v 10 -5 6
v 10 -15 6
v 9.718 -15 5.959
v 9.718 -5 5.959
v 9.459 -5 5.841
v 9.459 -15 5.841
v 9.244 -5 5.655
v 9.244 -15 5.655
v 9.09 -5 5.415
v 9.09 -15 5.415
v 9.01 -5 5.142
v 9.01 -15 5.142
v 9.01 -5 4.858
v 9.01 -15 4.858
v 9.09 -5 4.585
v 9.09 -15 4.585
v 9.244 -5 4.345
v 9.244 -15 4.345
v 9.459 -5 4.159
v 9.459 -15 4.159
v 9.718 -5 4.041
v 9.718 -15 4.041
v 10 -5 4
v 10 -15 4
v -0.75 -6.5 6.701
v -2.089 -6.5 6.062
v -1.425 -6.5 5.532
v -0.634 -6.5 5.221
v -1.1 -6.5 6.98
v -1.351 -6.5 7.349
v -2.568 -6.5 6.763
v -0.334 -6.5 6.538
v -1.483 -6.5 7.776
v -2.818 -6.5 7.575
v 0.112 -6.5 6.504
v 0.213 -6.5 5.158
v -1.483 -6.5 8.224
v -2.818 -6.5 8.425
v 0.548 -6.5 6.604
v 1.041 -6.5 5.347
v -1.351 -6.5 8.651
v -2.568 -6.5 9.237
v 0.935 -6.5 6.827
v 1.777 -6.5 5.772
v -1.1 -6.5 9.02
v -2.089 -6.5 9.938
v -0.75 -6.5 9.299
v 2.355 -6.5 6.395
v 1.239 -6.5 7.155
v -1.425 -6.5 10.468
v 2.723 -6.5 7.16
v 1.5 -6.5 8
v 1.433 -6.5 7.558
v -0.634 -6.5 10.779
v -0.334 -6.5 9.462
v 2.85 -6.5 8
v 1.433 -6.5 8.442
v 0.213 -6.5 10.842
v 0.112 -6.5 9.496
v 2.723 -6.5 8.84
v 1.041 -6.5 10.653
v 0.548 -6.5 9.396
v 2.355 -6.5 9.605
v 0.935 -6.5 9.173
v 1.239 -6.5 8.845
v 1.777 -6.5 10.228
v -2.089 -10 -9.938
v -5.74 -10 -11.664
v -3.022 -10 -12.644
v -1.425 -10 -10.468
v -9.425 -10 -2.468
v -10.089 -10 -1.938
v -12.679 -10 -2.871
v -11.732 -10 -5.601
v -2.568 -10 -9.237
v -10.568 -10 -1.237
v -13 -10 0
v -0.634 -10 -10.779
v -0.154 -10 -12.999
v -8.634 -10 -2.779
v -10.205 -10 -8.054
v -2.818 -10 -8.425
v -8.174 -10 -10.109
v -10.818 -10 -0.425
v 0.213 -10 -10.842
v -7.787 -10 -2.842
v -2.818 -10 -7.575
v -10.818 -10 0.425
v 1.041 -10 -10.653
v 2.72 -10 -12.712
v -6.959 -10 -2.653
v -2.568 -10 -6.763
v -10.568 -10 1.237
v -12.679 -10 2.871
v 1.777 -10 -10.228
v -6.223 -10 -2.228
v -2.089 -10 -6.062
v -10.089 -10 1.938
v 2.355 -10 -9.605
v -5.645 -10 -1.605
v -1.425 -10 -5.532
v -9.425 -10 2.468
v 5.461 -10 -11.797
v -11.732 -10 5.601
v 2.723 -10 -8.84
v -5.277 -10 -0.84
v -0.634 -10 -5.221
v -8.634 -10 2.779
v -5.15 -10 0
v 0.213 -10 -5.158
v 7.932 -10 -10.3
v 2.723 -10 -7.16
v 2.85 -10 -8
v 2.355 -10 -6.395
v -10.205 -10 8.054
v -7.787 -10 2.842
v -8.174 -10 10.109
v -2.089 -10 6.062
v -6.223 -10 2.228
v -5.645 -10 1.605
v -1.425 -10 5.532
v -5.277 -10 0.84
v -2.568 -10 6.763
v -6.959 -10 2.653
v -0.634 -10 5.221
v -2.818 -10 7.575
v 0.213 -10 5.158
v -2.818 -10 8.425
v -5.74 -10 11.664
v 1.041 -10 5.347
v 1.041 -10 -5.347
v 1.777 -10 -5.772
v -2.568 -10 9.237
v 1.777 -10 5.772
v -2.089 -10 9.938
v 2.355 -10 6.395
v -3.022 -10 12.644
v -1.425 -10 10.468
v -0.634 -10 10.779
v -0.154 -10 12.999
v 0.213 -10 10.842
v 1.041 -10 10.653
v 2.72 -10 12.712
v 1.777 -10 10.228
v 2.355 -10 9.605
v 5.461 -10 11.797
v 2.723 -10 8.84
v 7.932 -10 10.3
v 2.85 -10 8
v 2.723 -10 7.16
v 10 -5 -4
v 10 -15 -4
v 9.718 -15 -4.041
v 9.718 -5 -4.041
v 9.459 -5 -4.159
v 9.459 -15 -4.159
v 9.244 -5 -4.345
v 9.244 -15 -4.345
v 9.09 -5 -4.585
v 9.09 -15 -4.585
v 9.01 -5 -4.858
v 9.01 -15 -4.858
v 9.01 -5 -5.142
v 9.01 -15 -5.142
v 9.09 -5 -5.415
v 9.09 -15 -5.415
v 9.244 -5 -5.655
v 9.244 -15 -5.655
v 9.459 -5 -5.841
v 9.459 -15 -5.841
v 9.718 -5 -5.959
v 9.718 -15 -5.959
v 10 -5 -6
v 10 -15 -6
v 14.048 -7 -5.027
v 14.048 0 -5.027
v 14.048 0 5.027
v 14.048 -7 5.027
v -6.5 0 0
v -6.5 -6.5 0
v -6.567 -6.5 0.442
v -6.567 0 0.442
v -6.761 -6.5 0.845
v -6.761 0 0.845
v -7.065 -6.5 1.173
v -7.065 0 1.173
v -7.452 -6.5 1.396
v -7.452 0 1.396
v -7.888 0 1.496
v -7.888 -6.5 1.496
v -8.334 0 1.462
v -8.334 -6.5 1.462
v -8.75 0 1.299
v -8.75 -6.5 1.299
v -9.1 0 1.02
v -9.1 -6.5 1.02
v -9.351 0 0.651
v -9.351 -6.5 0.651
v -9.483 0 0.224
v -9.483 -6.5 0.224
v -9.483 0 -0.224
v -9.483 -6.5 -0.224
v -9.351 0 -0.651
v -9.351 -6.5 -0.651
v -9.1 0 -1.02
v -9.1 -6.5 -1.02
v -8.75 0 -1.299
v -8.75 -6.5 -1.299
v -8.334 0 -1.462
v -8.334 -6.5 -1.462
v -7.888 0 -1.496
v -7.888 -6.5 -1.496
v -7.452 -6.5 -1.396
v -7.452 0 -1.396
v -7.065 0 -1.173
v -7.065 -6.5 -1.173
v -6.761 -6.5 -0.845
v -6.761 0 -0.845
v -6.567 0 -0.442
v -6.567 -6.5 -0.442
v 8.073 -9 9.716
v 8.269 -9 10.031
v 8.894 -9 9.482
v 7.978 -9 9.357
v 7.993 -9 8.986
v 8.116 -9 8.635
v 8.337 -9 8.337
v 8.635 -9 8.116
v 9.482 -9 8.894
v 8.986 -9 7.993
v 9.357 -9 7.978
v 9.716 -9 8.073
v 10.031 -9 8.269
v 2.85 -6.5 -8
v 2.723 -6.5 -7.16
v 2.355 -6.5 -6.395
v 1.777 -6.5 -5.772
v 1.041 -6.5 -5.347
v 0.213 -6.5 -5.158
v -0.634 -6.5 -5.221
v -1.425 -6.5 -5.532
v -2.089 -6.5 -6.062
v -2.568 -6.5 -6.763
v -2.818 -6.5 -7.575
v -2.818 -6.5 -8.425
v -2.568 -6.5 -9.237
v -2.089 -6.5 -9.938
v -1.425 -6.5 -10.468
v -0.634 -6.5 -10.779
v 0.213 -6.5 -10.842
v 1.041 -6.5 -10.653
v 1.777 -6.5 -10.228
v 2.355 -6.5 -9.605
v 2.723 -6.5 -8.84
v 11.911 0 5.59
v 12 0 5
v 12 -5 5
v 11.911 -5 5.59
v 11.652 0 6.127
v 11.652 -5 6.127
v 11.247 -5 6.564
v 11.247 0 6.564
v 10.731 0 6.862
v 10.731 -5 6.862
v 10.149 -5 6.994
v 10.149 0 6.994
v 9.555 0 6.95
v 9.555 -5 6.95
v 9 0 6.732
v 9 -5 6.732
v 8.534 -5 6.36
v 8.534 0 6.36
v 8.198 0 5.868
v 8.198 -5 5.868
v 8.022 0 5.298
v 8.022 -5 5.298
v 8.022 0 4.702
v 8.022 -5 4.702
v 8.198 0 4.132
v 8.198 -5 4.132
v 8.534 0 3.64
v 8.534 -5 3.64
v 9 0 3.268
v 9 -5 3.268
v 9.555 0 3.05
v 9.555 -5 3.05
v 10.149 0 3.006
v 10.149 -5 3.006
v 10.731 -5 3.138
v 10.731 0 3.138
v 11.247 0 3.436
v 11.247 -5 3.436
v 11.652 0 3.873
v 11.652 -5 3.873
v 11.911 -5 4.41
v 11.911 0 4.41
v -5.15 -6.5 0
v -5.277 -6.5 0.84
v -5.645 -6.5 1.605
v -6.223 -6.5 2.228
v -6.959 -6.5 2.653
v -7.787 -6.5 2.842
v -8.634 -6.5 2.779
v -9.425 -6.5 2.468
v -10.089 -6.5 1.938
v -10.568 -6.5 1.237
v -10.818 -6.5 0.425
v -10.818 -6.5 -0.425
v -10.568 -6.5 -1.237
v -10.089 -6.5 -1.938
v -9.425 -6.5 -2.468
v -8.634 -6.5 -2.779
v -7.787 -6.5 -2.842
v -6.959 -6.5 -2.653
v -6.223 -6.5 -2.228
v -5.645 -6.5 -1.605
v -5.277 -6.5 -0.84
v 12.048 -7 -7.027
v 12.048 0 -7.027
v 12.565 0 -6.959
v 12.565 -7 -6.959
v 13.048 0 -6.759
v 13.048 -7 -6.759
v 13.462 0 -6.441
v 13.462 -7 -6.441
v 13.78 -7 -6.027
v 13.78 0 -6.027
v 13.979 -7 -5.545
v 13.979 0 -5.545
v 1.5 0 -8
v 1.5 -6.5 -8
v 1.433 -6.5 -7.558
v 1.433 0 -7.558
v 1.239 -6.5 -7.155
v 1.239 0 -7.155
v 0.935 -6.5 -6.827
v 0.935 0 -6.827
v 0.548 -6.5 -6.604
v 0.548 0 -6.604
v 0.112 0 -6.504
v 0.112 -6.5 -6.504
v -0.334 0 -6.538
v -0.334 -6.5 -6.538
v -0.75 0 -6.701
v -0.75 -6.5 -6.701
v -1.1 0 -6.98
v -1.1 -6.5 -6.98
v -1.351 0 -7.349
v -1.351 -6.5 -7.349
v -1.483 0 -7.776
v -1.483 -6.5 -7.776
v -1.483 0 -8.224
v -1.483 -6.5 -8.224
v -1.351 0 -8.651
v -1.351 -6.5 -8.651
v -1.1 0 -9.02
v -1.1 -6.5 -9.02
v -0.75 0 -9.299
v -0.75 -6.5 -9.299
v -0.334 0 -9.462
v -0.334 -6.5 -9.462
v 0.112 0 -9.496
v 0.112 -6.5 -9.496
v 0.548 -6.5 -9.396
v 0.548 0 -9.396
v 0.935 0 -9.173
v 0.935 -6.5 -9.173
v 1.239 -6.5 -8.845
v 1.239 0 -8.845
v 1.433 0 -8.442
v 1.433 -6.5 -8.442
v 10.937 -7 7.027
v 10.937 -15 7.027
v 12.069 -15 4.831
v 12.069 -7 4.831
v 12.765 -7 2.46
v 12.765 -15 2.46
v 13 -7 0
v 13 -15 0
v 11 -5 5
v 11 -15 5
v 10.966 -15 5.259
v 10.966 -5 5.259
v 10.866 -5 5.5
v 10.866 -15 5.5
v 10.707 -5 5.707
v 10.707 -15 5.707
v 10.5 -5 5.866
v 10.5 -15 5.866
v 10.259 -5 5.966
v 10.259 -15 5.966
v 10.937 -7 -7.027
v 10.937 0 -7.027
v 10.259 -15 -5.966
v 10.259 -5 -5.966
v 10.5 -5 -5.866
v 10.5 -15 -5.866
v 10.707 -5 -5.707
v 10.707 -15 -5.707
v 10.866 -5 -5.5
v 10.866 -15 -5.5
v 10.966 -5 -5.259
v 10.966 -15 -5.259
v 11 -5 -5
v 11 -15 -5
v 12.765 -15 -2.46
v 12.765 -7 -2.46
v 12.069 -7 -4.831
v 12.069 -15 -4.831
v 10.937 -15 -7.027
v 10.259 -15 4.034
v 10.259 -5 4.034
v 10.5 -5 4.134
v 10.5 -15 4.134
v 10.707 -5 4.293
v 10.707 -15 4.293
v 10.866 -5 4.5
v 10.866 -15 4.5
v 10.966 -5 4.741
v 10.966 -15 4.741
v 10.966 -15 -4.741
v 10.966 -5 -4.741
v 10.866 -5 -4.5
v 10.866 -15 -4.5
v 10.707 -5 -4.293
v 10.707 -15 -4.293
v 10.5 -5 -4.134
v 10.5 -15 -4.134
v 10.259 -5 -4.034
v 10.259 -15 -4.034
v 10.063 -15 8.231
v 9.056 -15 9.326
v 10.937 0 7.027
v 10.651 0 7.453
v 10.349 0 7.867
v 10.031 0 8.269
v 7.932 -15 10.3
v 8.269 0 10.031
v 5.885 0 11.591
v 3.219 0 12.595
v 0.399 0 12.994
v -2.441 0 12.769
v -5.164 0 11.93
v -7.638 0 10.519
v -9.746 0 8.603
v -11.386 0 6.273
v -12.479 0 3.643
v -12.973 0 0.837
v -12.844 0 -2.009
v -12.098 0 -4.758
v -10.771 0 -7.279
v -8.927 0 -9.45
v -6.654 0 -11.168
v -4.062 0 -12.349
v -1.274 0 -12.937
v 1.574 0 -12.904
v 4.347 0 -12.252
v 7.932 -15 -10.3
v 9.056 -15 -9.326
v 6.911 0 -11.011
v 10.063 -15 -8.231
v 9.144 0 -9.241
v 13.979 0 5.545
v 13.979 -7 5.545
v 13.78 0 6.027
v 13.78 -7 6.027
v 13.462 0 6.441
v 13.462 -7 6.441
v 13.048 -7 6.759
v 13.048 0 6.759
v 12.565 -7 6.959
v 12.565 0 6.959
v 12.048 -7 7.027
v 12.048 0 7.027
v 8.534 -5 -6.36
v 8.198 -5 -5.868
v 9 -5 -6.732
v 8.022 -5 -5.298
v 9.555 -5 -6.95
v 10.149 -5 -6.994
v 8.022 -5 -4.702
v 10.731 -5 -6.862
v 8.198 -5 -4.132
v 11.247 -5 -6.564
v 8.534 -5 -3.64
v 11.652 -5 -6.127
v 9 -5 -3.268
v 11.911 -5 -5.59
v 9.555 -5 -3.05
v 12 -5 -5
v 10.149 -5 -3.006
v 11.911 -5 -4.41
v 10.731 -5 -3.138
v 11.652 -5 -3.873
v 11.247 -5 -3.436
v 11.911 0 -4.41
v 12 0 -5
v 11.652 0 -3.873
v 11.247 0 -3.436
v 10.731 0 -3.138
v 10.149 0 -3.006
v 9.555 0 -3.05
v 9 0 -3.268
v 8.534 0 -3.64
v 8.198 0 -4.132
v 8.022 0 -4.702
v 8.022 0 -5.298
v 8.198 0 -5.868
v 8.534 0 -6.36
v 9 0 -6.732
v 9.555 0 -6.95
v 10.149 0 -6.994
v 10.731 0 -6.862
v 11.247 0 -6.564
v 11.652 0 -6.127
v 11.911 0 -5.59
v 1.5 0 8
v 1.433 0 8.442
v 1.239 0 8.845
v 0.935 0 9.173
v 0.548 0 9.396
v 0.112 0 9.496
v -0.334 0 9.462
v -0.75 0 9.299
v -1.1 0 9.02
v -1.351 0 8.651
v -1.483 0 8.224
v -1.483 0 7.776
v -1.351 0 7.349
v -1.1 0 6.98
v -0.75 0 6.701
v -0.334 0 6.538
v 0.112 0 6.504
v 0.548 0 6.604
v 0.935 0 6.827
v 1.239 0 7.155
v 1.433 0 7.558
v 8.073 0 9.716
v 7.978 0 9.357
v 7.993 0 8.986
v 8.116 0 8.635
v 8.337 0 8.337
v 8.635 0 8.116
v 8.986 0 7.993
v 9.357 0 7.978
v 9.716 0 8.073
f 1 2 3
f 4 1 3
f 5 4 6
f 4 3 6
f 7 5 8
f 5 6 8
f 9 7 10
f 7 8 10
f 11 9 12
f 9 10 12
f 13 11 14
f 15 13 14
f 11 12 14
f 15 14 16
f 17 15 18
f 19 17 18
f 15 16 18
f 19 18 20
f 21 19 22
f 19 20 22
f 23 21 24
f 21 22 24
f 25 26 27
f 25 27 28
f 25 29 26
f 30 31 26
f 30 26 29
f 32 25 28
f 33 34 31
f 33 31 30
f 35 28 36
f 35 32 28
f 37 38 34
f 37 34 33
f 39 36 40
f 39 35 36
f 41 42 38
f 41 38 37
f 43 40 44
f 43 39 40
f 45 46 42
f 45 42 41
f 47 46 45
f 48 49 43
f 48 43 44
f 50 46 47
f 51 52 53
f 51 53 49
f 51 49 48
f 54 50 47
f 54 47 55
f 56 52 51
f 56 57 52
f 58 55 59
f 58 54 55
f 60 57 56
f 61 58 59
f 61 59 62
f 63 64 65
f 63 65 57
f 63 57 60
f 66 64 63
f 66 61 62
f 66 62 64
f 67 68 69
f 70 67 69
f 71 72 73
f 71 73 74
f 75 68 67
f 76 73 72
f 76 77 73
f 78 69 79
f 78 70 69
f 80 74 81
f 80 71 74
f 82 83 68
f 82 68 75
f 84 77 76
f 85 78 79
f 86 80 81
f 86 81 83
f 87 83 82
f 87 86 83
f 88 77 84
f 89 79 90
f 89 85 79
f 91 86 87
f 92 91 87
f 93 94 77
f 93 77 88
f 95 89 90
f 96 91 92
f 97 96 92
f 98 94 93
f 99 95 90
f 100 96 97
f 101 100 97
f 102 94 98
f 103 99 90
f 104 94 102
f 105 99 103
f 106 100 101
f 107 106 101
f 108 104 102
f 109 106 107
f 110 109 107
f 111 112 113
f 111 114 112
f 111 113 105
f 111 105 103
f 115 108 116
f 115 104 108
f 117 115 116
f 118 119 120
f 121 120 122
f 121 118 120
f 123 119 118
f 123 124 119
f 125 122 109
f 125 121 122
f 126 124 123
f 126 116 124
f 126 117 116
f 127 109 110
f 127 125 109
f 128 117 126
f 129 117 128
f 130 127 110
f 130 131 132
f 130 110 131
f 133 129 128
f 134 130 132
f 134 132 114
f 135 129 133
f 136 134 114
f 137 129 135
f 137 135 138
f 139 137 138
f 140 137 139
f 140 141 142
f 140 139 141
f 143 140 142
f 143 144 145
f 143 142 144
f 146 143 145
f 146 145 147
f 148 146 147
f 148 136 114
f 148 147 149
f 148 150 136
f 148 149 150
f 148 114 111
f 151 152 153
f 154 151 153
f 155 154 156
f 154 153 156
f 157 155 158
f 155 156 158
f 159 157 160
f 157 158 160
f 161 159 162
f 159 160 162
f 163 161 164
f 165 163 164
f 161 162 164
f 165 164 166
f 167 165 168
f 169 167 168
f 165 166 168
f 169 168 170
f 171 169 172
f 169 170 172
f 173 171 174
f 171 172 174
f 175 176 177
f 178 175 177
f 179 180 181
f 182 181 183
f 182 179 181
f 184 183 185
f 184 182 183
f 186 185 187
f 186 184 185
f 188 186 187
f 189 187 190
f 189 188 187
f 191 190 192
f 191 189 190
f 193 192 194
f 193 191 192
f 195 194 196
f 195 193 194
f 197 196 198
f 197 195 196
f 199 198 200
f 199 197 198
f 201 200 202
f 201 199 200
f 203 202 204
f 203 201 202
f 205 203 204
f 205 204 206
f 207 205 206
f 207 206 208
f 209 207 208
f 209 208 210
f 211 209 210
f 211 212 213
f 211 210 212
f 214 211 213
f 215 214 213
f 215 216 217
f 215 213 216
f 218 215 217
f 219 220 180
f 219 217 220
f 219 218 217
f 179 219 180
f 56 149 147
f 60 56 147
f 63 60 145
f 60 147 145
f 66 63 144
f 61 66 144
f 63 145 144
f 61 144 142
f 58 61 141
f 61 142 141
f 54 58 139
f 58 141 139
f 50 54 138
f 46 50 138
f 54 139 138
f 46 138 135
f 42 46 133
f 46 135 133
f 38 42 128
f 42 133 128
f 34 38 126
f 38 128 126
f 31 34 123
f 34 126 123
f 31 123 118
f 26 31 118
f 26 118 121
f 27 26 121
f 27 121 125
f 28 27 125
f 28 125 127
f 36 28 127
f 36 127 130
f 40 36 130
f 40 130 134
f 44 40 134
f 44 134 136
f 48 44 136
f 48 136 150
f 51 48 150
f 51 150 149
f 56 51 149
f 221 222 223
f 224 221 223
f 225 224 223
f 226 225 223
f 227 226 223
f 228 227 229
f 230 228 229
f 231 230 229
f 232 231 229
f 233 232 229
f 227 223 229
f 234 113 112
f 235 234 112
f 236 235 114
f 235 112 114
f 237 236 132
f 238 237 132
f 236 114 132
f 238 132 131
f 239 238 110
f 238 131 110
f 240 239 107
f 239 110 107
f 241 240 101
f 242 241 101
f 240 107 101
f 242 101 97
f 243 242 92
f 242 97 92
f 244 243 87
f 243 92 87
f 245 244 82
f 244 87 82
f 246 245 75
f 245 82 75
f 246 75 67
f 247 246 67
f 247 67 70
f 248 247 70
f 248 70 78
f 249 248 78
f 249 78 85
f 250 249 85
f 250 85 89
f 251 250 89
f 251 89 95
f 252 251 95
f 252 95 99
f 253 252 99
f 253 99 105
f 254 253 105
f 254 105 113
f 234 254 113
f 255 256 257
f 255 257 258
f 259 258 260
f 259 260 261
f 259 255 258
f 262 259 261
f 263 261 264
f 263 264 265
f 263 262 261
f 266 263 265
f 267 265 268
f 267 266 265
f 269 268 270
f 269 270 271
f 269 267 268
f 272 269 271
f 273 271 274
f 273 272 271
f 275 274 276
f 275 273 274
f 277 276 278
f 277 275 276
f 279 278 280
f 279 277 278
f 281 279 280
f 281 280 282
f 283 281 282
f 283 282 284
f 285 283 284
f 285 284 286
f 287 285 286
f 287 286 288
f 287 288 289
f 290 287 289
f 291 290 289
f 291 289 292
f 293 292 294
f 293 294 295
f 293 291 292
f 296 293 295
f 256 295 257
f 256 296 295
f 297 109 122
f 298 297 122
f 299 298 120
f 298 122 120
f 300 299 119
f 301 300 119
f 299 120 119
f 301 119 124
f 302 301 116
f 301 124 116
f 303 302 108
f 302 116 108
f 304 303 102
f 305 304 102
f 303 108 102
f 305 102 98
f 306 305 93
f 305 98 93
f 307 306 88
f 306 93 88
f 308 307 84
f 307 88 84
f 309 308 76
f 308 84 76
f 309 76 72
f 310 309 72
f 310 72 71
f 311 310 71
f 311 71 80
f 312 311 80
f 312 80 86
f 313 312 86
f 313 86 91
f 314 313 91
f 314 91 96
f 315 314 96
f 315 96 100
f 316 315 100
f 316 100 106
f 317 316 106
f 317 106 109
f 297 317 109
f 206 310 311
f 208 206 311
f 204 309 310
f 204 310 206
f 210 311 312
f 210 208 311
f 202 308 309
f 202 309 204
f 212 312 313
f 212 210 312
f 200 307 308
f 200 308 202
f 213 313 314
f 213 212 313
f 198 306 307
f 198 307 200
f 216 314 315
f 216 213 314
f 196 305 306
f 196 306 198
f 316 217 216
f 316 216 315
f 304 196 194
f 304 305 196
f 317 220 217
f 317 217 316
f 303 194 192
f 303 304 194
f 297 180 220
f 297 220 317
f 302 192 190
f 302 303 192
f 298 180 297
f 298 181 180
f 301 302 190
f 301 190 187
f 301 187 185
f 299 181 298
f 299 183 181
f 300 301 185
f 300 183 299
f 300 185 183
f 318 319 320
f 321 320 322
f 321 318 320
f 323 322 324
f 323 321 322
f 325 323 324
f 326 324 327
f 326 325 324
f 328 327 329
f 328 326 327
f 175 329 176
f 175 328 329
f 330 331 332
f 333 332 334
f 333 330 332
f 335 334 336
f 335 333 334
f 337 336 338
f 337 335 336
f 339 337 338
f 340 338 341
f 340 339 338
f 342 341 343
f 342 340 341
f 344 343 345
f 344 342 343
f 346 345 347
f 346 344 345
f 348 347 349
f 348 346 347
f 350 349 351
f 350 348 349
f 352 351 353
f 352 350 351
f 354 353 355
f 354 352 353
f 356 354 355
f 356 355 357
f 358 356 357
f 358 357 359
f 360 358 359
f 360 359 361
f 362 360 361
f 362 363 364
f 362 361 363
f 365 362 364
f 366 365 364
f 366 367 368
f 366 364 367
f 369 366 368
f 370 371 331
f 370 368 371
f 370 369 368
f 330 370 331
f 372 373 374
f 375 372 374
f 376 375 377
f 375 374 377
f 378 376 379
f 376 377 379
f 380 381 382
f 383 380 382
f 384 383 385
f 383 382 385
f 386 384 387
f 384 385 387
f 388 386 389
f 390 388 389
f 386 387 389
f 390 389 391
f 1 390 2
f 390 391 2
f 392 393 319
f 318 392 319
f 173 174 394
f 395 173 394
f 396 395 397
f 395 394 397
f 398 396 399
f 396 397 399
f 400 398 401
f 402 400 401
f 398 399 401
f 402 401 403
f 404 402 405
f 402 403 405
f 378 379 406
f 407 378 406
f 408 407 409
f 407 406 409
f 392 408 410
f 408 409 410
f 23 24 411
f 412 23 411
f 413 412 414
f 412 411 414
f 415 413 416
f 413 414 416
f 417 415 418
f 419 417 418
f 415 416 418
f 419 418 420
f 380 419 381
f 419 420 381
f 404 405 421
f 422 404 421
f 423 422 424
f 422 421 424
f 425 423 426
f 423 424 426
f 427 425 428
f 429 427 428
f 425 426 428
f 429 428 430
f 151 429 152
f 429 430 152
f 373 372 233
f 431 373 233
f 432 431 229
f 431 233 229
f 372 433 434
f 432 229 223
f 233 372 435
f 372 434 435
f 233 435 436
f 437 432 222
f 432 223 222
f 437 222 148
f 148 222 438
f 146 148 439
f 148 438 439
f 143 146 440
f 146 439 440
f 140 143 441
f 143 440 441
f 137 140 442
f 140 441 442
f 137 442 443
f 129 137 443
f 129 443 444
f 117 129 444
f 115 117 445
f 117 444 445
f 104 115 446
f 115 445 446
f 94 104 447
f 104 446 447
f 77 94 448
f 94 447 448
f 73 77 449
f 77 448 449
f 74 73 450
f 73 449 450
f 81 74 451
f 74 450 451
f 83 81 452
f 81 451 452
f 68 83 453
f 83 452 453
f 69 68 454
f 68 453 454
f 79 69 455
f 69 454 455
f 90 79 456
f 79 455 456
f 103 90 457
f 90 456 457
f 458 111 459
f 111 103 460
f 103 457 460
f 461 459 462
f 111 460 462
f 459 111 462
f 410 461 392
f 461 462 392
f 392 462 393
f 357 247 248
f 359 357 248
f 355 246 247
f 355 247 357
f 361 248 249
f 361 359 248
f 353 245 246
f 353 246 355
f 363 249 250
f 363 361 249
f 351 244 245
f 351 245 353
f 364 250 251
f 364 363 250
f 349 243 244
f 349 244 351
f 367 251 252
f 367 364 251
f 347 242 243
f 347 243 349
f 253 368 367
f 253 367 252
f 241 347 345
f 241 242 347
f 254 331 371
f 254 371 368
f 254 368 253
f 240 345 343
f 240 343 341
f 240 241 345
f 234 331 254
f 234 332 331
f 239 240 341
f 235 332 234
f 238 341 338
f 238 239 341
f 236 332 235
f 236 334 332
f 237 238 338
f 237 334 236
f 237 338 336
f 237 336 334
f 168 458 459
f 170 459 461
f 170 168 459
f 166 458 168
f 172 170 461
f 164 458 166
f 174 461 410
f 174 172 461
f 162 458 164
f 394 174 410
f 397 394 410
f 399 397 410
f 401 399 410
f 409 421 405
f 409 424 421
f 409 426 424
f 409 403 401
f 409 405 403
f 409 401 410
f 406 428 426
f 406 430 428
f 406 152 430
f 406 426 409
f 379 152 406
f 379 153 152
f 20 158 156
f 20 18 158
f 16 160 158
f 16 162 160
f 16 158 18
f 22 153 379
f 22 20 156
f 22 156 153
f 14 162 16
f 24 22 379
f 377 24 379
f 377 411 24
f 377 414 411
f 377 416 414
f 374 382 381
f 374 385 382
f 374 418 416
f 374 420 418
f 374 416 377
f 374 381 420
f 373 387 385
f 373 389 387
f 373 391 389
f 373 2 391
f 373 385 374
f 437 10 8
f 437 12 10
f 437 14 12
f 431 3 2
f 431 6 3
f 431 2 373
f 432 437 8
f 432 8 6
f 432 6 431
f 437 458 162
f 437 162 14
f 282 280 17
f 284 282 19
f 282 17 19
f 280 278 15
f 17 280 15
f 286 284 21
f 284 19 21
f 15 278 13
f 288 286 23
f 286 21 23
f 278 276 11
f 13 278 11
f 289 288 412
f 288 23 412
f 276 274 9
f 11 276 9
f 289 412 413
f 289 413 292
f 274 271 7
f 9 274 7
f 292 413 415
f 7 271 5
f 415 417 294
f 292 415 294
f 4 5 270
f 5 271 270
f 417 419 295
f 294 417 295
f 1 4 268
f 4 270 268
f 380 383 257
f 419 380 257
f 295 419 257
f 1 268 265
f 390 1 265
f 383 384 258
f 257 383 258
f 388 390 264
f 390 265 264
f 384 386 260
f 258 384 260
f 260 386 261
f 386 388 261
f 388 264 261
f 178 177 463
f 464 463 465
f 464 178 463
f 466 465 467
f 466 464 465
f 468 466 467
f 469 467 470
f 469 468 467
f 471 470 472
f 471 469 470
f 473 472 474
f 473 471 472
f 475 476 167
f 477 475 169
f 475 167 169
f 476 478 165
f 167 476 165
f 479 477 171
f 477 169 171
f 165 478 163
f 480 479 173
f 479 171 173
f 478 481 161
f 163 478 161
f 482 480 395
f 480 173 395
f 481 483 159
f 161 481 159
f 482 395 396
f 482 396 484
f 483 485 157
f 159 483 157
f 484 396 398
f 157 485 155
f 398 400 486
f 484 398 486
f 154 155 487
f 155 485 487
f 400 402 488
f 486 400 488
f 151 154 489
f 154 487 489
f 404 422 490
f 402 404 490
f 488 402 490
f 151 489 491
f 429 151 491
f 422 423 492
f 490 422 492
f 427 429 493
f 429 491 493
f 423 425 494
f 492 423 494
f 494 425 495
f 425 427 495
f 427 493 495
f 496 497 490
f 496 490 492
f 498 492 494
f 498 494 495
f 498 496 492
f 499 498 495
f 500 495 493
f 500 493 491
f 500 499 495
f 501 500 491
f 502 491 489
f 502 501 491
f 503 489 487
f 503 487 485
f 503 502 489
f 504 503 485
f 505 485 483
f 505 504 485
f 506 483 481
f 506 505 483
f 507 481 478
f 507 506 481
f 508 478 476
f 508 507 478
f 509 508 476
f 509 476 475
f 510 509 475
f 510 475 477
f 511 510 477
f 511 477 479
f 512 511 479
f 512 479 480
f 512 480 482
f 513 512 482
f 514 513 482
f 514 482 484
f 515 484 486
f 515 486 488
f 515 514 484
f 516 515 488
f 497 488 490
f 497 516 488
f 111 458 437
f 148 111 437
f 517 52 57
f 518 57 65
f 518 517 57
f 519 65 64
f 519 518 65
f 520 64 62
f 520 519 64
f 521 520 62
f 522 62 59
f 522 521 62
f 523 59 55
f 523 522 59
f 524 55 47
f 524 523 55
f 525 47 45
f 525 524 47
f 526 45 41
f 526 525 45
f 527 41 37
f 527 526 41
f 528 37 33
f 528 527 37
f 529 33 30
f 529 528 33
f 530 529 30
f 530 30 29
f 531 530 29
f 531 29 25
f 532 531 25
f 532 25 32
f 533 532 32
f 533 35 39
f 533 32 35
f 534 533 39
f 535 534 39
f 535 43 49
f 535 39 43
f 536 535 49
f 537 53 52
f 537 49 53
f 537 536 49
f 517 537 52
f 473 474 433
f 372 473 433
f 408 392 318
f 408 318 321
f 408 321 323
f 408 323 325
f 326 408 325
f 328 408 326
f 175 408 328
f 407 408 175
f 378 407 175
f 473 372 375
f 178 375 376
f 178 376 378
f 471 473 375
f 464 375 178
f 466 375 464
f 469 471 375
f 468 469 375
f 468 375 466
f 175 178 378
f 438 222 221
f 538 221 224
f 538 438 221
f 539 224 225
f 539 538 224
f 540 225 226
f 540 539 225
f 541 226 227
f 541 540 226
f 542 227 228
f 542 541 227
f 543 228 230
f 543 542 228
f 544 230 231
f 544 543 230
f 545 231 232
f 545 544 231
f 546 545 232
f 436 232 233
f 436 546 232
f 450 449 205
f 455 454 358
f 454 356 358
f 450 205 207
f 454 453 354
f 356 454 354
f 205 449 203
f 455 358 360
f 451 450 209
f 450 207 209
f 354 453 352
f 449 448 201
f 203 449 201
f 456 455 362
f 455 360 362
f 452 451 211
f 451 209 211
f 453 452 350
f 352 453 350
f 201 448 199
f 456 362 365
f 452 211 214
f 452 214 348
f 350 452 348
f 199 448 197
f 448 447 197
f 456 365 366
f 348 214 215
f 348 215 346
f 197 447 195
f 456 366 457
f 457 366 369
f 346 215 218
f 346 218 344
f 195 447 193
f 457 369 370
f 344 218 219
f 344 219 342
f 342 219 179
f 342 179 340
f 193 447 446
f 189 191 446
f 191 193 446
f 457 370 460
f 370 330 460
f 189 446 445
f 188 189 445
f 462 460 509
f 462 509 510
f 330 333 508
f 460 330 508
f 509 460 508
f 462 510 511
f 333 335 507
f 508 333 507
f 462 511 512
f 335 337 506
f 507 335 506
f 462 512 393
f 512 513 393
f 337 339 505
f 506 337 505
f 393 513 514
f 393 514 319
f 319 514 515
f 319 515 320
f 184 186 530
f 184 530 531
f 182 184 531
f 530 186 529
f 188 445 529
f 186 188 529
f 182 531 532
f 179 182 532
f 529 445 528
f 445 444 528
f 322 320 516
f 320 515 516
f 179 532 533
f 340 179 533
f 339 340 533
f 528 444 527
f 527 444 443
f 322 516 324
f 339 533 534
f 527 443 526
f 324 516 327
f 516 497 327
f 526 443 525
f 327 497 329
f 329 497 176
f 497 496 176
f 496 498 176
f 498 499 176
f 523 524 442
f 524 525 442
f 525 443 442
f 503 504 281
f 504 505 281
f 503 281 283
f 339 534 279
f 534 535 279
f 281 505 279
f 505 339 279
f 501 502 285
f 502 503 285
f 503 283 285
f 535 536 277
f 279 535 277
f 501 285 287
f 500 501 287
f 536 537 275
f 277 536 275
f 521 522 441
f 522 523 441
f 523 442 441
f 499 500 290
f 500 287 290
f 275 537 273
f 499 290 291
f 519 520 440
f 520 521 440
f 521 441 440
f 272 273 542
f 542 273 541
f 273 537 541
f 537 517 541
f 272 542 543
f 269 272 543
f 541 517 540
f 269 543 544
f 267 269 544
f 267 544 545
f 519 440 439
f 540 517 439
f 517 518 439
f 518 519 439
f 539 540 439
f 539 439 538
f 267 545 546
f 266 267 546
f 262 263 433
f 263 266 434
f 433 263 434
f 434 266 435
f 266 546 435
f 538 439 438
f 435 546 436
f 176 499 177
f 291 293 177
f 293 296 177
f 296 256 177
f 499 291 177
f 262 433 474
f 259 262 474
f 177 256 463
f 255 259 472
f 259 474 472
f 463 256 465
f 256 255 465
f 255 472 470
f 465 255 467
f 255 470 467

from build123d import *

# Parameters (mm, degrees)
F0_R      = 1.5
F1_DEPTH  = 15
F4_DEPTH  = 15
F5_R      = 2
F6_DEPTH  = 5
F7_R      = 2.85
F8_DEPTH  = 8.5
F9_R      = 2
F10_R     = 1.25
F11_DEPTH = 9
F13_DEPTH = 8
F14_R     = 2.85
F15_DEPTH = 5


with BuildPart() as f1:
    # F0 (on Front) → F1 (new body)
    with BuildSketch(Plane.XZ):
        with BuildLine():
            ThreePointArc((10.9369710195, -7.0272800513), (12.473584554, -3.6619241354), (13, 0))
            ThreePointArc((13, 0), (12.473584554, 3.6619241354), (10.9369710195, 7.0272800513))
            Line((10.9369710195, 7.0272800513), (10.9369710195, -7.0272800513))
        make_face()
        with BuildLine():
            ThreePointArc((10.9369710195, 7.0272800513), (12.473584554, 3.6619241354), (13, 0))
            ThreePointArc((13, 0), (12.473584554, -3.6619241354), (10.9369710195, -7.0272800513))
            Line((10.9369710195, -7.0272800513), (14.0475723892, -7.0272800513))
            Line((14.0475723892, -7.0272800513), (14.0475723892, 7.0272800513))
            Line((14.0475723892, 7.0272800513), (10.9369710195, 7.0272800513))
        make_face()
        with BuildLine():
            Line((10.9369710195, -7.0272800513), (10.9369710195, 7.0272800513))
            ThreePointArc((10.9369710195, 7.0272800513), (-13, 0), (10.9369710195, -7.0272800513))
        make_face()
        with Locations((0, -8)):
            Circle(F0_R, mode=Mode.SUBTRACT)
        with Locations((-8, 0)):
            Circle(F0_R, mode=Mode.SUBTRACT)
        with Locations((0, 8)):
            Circle(F0_R, mode=Mode.SUBTRACT)
    extrude(amount=F1_DEPTH)

    # F3 (on face) → F4 (cut)
    with BuildSketch(Plane.XZ.offset(15)):
        with BuildLine():
            ThreePointArc((11, 5), (10.7071067812, 5.7071067812), (10, 6))
            Line((10, 6), (10, 4))
            ThreePointArc((10, 4), (10.7071067812, 4.2928932188), (11, 5))
        make_face()
        with BuildLine():
            ThreePointArc((11, -5), (10.7071067812, -4.2928932188), (10, -4))
            Line((10, -4), (10, -6))
            ThreePointArc((10, -6), (10.7071067812, -5.7071067812), (11, -5))
        make_face()
        with BuildLine():
            Line((10, -6), (10, -4))
            ThreePointArc((10, -4), (9, -5), (10, -6))
        make_face()
        with BuildLine():
            Line((10, 4), (10, 6))
            ThreePointArc((10, 6), (9, 5), (10, 4))
        make_face()
    extrude(amount=-F4_DEPTH, mode=Mode.SUBTRACT)

    # F5 (on face) → F6 (cut)
    with BuildSketch(Plane.XZ):
        with Locations((10, 5)):
            Circle(F5_R)
        with Locations((10, -5)):
            Circle(F5_R)
    extrude(amount=F6_DEPTH, mode=Mode.SUBTRACT)

    # F7 (on face) → F8 (cut)
    with BuildSketch(Plane.XZ.offset(15)):
        with Locations((0, 8)):
            Circle(F7_R)
        with Locations((0, -8)):
            Circle(F7_R)
        with Locations((-8, 0)):
            Circle(F7_R)
    extrude(amount=-F8_DEPTH, mode=Mode.SUBTRACT)

    # F9
    f9_edges = [f1.edges().sort_by_distance(p)[0] for p in [
        (14.047572, -7.5, 7.02728),
        (14.047572, -7.5, -7.02728),
    ]]
    fillet(f9_edges, radius=F9_R)

    # F10 (on face) → F11 (cut)
    with BuildSketch(Plane.XZ):
        with Locations((9.2203840613, 9.2203840613)):
            Circle(F10_R)
    extrude(amount=F11_DEPTH, mode=Mode.SUBTRACT)

    # F12 (on face) → F13 (cut)
    with BuildSketch(Plane.XZ.offset(15)):
        with BuildLine():
            ThreePointArc((10.9369710195, 7.0272800513), (12.473584554, 3.6619241354), (13, 0))
            ThreePointArc((13, 0), (12.473584554, -3.6619241354), (10.9369710195, -7.0272800513))
            Line((10.9369710195, -7.0272800513), (12.0475723892, -7.0272800513))
            ThreePointArc((12.0475723892, -7.0272800513), (13.4617859516, -6.4414936136), (14.0475723892, -5.0272800513))
            Line((14.0475723892, -5.0272800513), (14.0475723892, 5.0272800513))
            ThreePointArc((14.0475723892, 5.0272800513), (13.4617859516, 6.4414936136), (12.0475723892, 7.0272800513))
            Line((12.0475723892, 7.0272800513), (10.9369710195, 7.0272800513))
        make_face()
    extrude(amount=-F13_DEPTH, mode=Mode.SUBTRACT)

    # F14 (on face) → F15 (cut)
    with BuildSketch(Plane.XZ.offset(15)):
        with BuildLine():
            Line((7.9317564177, -10.2998660248), (7.9317564177, 10.2998660248))
            ThreePointArc((7.9317564177, 10.2998660248), (-13, 0), (7.9317564177, -10.2998660248))
        make_face()
        with Locations((0, -8)):
            Circle(F14_R, mode=Mode.SUBTRACT)
        with Locations((-8, 0)):
            Circle(F14_R, mode=Mode.SUBTRACT)
        with Locations((0, 8)):
            Circle(F14_R, mode=Mode.SUBTRACT)
    extrude(amount=-F15_DEPTH, mode=Mode.SUBTRACT)


solid = f1.part
